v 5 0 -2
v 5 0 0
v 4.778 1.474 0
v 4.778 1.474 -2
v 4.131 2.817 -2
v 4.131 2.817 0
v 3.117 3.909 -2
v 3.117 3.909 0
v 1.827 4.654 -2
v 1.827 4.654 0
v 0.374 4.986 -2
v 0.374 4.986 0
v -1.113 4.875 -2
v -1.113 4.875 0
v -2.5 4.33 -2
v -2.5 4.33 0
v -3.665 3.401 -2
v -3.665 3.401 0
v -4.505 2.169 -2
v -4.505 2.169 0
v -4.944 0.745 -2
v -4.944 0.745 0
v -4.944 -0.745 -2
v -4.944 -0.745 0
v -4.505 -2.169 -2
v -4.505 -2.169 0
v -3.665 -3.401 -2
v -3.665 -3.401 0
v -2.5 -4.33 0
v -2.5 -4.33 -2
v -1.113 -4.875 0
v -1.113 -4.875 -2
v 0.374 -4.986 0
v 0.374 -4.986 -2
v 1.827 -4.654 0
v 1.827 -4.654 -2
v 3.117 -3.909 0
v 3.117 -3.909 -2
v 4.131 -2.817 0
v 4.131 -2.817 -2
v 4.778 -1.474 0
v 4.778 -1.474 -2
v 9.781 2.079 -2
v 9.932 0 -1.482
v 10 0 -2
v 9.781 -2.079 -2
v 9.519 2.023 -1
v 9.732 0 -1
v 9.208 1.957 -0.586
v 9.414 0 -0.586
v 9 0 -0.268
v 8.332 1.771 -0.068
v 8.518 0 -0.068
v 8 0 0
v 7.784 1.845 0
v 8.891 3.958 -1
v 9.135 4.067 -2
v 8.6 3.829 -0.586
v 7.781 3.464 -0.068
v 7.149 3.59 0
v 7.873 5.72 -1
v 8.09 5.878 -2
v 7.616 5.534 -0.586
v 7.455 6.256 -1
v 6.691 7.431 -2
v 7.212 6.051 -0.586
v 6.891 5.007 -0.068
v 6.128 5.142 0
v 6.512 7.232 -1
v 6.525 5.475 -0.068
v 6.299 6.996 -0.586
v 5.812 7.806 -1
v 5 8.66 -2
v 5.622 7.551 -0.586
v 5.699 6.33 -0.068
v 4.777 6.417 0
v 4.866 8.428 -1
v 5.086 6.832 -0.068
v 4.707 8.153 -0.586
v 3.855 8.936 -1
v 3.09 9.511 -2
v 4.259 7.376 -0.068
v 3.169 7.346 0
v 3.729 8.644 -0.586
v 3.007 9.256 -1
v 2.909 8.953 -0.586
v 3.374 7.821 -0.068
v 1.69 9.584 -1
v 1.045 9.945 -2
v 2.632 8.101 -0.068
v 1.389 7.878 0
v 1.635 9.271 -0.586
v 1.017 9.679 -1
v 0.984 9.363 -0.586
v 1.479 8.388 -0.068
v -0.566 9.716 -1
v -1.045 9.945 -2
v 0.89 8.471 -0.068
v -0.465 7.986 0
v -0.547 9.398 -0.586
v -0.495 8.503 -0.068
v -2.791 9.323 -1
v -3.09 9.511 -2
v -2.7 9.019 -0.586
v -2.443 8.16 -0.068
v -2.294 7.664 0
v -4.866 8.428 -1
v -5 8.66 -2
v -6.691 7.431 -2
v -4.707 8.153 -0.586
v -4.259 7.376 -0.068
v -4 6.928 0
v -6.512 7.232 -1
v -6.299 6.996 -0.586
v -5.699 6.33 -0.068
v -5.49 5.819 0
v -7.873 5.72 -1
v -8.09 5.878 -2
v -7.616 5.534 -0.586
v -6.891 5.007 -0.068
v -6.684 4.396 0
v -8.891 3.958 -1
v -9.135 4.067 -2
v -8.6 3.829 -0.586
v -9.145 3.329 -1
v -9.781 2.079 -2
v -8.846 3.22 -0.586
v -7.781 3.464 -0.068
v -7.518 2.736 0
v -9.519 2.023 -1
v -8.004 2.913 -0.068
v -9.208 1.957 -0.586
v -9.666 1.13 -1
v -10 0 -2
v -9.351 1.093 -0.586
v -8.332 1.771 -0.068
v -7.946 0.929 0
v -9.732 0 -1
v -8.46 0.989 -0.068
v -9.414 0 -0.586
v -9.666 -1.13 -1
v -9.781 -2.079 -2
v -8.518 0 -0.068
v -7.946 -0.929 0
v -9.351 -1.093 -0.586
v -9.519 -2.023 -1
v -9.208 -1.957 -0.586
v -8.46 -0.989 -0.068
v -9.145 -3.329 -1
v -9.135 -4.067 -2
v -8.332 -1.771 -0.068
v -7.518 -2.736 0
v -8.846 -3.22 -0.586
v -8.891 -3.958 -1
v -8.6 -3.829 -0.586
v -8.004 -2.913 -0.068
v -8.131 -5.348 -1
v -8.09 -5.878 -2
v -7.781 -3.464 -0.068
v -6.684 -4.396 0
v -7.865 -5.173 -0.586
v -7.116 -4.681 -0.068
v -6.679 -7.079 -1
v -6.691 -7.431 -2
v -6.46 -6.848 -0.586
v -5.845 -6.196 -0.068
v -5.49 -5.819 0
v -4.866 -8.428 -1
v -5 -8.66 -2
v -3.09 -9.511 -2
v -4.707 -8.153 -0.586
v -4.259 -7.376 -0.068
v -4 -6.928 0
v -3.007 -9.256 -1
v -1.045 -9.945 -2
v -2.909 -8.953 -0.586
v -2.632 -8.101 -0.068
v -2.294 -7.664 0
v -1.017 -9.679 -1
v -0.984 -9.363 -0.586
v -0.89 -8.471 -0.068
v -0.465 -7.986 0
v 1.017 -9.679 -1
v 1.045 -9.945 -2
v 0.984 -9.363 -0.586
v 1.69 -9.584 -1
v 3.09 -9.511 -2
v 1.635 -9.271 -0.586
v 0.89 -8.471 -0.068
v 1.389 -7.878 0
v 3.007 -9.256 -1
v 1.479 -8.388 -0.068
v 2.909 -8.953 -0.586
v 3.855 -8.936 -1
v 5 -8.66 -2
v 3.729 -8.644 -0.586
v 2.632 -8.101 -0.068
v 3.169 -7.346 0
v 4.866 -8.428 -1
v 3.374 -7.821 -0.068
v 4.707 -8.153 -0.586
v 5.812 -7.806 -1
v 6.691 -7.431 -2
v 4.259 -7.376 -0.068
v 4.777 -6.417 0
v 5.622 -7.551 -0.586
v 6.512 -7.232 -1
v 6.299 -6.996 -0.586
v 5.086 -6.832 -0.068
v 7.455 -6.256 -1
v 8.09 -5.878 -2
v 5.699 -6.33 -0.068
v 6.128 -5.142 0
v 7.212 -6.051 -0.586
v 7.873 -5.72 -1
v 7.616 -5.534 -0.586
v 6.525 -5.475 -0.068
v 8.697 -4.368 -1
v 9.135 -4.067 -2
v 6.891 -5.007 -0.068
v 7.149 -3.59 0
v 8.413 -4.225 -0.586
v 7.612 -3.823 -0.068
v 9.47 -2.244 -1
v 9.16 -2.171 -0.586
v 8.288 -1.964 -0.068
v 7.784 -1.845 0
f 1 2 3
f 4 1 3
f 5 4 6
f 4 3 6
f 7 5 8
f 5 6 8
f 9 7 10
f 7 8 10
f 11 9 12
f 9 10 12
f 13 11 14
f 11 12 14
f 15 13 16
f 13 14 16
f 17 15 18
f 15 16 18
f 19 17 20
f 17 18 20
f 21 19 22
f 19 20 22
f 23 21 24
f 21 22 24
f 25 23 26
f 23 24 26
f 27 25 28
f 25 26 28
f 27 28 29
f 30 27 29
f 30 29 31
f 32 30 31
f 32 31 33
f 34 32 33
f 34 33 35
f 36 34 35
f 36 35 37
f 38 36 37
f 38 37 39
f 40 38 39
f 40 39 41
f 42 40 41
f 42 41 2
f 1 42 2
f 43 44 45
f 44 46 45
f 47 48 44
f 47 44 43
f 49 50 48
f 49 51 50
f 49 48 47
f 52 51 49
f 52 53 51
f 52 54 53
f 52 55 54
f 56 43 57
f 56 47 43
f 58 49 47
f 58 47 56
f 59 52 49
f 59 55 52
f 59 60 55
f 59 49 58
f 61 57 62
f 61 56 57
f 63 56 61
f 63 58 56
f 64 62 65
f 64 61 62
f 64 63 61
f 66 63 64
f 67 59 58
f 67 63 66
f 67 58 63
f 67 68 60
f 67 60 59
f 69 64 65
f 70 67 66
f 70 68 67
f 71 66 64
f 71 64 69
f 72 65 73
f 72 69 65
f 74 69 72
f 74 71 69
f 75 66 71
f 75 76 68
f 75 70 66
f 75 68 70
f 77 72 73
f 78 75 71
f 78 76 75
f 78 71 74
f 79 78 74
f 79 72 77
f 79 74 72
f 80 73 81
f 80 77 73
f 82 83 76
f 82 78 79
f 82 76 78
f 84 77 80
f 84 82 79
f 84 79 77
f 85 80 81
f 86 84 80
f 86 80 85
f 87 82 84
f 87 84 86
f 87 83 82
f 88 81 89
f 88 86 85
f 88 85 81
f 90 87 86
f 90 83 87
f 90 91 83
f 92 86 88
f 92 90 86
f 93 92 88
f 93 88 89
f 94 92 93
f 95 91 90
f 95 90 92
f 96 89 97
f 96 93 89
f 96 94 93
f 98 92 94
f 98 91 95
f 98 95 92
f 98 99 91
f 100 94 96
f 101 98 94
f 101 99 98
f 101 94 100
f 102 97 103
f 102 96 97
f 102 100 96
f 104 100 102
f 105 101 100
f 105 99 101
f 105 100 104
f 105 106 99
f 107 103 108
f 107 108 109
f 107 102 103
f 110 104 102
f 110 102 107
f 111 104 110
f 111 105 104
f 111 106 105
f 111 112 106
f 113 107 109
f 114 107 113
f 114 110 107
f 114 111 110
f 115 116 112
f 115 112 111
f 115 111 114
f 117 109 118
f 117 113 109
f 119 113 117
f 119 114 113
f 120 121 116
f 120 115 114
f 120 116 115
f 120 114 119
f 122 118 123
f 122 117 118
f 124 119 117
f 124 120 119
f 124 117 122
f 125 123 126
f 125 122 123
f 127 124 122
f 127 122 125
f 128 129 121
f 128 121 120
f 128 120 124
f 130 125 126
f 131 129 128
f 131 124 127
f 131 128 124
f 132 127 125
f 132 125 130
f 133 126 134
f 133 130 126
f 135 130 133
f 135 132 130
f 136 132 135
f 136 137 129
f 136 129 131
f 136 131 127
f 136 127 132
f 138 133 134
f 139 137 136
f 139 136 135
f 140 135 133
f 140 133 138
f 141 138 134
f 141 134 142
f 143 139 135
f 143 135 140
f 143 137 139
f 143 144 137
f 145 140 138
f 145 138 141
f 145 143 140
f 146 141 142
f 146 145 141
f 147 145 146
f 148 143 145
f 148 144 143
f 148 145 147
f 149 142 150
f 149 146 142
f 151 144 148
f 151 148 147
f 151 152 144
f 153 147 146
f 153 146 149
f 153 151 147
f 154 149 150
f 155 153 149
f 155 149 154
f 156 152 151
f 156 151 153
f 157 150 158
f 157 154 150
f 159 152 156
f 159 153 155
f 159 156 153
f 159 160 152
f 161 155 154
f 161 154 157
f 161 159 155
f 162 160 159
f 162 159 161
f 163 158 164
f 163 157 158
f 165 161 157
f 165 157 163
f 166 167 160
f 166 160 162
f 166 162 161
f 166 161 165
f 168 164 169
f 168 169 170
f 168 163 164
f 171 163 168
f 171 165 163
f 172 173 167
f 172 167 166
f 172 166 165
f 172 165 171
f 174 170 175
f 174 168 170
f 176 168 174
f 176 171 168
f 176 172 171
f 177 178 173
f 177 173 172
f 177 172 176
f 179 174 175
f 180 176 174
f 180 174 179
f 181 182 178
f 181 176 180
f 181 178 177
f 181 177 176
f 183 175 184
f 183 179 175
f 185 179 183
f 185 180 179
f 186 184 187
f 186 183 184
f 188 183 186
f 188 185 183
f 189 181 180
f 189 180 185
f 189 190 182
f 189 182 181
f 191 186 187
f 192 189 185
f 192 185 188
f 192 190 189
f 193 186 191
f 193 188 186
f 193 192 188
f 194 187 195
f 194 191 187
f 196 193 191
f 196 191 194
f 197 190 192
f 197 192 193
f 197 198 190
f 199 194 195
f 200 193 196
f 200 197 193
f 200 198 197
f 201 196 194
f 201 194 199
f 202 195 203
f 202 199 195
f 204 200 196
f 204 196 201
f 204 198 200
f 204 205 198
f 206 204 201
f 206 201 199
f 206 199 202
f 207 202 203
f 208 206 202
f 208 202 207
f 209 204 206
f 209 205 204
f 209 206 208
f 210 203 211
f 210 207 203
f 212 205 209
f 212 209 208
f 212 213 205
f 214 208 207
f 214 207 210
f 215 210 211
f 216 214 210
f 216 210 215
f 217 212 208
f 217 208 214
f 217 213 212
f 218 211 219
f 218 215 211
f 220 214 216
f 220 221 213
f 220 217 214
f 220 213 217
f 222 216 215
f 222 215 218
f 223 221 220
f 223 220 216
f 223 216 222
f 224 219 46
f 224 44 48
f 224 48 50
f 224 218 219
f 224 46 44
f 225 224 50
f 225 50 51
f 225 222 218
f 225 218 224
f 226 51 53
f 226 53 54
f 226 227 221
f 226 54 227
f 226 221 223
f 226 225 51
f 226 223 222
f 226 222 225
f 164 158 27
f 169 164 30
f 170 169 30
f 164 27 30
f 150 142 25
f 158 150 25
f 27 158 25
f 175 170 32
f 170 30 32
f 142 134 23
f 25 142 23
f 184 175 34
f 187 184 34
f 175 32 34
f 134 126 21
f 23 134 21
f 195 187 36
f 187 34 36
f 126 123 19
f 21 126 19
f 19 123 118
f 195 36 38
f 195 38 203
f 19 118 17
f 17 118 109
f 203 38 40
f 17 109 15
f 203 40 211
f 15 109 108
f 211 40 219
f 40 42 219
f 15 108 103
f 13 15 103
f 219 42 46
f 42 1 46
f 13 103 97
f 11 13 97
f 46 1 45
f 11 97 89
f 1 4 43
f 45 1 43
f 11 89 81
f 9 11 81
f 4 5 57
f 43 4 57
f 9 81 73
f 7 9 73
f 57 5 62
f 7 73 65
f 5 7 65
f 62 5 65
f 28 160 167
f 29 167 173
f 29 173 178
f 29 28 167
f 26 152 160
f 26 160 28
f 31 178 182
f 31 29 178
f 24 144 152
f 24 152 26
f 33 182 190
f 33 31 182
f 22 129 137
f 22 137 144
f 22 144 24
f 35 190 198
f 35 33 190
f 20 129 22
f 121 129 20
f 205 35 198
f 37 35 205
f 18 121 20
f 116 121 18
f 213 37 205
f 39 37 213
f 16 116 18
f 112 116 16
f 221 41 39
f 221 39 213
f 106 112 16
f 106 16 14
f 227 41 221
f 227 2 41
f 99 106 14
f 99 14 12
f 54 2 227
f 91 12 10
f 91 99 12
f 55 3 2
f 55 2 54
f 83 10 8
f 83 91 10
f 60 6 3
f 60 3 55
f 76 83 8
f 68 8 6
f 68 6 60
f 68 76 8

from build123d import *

# Parameters (mm, degrees)
F0_R     = 10
F1_DEPTH = 2
F2_R     = 1.99999
F3_R     = 5
F4_DEPTH = 25


# Not quite as in the source:
# - a fillet or chamfer is up to 0.001 mm smaller than in the source, because OpenCascade refuses the exact size


with BuildPart() as f1:
    # F0 (on Top) → F1 (new body)
    with BuildSketch(Plane.XY):
        Circle(F0_R)
    extrude(amount=-F1_DEPTH)

    # F2 (radius 2 in the source; OpenCascade refuses exactly that, so slightly less here)
    f2_edges = [f1.edges().sort_by_distance(p)[0] for p in [
        (-10, 0, 0),
    ]]
    fillet(f2_edges, radius=F2_R)

    # F3 (on face) → F4 (cut)
    with BuildSketch(Plane.XY):
        Circle(F3_R)
    extrude(amount=-F4_DEPTH, mode=Mode.SUBTRACT)


solid = f1.part
